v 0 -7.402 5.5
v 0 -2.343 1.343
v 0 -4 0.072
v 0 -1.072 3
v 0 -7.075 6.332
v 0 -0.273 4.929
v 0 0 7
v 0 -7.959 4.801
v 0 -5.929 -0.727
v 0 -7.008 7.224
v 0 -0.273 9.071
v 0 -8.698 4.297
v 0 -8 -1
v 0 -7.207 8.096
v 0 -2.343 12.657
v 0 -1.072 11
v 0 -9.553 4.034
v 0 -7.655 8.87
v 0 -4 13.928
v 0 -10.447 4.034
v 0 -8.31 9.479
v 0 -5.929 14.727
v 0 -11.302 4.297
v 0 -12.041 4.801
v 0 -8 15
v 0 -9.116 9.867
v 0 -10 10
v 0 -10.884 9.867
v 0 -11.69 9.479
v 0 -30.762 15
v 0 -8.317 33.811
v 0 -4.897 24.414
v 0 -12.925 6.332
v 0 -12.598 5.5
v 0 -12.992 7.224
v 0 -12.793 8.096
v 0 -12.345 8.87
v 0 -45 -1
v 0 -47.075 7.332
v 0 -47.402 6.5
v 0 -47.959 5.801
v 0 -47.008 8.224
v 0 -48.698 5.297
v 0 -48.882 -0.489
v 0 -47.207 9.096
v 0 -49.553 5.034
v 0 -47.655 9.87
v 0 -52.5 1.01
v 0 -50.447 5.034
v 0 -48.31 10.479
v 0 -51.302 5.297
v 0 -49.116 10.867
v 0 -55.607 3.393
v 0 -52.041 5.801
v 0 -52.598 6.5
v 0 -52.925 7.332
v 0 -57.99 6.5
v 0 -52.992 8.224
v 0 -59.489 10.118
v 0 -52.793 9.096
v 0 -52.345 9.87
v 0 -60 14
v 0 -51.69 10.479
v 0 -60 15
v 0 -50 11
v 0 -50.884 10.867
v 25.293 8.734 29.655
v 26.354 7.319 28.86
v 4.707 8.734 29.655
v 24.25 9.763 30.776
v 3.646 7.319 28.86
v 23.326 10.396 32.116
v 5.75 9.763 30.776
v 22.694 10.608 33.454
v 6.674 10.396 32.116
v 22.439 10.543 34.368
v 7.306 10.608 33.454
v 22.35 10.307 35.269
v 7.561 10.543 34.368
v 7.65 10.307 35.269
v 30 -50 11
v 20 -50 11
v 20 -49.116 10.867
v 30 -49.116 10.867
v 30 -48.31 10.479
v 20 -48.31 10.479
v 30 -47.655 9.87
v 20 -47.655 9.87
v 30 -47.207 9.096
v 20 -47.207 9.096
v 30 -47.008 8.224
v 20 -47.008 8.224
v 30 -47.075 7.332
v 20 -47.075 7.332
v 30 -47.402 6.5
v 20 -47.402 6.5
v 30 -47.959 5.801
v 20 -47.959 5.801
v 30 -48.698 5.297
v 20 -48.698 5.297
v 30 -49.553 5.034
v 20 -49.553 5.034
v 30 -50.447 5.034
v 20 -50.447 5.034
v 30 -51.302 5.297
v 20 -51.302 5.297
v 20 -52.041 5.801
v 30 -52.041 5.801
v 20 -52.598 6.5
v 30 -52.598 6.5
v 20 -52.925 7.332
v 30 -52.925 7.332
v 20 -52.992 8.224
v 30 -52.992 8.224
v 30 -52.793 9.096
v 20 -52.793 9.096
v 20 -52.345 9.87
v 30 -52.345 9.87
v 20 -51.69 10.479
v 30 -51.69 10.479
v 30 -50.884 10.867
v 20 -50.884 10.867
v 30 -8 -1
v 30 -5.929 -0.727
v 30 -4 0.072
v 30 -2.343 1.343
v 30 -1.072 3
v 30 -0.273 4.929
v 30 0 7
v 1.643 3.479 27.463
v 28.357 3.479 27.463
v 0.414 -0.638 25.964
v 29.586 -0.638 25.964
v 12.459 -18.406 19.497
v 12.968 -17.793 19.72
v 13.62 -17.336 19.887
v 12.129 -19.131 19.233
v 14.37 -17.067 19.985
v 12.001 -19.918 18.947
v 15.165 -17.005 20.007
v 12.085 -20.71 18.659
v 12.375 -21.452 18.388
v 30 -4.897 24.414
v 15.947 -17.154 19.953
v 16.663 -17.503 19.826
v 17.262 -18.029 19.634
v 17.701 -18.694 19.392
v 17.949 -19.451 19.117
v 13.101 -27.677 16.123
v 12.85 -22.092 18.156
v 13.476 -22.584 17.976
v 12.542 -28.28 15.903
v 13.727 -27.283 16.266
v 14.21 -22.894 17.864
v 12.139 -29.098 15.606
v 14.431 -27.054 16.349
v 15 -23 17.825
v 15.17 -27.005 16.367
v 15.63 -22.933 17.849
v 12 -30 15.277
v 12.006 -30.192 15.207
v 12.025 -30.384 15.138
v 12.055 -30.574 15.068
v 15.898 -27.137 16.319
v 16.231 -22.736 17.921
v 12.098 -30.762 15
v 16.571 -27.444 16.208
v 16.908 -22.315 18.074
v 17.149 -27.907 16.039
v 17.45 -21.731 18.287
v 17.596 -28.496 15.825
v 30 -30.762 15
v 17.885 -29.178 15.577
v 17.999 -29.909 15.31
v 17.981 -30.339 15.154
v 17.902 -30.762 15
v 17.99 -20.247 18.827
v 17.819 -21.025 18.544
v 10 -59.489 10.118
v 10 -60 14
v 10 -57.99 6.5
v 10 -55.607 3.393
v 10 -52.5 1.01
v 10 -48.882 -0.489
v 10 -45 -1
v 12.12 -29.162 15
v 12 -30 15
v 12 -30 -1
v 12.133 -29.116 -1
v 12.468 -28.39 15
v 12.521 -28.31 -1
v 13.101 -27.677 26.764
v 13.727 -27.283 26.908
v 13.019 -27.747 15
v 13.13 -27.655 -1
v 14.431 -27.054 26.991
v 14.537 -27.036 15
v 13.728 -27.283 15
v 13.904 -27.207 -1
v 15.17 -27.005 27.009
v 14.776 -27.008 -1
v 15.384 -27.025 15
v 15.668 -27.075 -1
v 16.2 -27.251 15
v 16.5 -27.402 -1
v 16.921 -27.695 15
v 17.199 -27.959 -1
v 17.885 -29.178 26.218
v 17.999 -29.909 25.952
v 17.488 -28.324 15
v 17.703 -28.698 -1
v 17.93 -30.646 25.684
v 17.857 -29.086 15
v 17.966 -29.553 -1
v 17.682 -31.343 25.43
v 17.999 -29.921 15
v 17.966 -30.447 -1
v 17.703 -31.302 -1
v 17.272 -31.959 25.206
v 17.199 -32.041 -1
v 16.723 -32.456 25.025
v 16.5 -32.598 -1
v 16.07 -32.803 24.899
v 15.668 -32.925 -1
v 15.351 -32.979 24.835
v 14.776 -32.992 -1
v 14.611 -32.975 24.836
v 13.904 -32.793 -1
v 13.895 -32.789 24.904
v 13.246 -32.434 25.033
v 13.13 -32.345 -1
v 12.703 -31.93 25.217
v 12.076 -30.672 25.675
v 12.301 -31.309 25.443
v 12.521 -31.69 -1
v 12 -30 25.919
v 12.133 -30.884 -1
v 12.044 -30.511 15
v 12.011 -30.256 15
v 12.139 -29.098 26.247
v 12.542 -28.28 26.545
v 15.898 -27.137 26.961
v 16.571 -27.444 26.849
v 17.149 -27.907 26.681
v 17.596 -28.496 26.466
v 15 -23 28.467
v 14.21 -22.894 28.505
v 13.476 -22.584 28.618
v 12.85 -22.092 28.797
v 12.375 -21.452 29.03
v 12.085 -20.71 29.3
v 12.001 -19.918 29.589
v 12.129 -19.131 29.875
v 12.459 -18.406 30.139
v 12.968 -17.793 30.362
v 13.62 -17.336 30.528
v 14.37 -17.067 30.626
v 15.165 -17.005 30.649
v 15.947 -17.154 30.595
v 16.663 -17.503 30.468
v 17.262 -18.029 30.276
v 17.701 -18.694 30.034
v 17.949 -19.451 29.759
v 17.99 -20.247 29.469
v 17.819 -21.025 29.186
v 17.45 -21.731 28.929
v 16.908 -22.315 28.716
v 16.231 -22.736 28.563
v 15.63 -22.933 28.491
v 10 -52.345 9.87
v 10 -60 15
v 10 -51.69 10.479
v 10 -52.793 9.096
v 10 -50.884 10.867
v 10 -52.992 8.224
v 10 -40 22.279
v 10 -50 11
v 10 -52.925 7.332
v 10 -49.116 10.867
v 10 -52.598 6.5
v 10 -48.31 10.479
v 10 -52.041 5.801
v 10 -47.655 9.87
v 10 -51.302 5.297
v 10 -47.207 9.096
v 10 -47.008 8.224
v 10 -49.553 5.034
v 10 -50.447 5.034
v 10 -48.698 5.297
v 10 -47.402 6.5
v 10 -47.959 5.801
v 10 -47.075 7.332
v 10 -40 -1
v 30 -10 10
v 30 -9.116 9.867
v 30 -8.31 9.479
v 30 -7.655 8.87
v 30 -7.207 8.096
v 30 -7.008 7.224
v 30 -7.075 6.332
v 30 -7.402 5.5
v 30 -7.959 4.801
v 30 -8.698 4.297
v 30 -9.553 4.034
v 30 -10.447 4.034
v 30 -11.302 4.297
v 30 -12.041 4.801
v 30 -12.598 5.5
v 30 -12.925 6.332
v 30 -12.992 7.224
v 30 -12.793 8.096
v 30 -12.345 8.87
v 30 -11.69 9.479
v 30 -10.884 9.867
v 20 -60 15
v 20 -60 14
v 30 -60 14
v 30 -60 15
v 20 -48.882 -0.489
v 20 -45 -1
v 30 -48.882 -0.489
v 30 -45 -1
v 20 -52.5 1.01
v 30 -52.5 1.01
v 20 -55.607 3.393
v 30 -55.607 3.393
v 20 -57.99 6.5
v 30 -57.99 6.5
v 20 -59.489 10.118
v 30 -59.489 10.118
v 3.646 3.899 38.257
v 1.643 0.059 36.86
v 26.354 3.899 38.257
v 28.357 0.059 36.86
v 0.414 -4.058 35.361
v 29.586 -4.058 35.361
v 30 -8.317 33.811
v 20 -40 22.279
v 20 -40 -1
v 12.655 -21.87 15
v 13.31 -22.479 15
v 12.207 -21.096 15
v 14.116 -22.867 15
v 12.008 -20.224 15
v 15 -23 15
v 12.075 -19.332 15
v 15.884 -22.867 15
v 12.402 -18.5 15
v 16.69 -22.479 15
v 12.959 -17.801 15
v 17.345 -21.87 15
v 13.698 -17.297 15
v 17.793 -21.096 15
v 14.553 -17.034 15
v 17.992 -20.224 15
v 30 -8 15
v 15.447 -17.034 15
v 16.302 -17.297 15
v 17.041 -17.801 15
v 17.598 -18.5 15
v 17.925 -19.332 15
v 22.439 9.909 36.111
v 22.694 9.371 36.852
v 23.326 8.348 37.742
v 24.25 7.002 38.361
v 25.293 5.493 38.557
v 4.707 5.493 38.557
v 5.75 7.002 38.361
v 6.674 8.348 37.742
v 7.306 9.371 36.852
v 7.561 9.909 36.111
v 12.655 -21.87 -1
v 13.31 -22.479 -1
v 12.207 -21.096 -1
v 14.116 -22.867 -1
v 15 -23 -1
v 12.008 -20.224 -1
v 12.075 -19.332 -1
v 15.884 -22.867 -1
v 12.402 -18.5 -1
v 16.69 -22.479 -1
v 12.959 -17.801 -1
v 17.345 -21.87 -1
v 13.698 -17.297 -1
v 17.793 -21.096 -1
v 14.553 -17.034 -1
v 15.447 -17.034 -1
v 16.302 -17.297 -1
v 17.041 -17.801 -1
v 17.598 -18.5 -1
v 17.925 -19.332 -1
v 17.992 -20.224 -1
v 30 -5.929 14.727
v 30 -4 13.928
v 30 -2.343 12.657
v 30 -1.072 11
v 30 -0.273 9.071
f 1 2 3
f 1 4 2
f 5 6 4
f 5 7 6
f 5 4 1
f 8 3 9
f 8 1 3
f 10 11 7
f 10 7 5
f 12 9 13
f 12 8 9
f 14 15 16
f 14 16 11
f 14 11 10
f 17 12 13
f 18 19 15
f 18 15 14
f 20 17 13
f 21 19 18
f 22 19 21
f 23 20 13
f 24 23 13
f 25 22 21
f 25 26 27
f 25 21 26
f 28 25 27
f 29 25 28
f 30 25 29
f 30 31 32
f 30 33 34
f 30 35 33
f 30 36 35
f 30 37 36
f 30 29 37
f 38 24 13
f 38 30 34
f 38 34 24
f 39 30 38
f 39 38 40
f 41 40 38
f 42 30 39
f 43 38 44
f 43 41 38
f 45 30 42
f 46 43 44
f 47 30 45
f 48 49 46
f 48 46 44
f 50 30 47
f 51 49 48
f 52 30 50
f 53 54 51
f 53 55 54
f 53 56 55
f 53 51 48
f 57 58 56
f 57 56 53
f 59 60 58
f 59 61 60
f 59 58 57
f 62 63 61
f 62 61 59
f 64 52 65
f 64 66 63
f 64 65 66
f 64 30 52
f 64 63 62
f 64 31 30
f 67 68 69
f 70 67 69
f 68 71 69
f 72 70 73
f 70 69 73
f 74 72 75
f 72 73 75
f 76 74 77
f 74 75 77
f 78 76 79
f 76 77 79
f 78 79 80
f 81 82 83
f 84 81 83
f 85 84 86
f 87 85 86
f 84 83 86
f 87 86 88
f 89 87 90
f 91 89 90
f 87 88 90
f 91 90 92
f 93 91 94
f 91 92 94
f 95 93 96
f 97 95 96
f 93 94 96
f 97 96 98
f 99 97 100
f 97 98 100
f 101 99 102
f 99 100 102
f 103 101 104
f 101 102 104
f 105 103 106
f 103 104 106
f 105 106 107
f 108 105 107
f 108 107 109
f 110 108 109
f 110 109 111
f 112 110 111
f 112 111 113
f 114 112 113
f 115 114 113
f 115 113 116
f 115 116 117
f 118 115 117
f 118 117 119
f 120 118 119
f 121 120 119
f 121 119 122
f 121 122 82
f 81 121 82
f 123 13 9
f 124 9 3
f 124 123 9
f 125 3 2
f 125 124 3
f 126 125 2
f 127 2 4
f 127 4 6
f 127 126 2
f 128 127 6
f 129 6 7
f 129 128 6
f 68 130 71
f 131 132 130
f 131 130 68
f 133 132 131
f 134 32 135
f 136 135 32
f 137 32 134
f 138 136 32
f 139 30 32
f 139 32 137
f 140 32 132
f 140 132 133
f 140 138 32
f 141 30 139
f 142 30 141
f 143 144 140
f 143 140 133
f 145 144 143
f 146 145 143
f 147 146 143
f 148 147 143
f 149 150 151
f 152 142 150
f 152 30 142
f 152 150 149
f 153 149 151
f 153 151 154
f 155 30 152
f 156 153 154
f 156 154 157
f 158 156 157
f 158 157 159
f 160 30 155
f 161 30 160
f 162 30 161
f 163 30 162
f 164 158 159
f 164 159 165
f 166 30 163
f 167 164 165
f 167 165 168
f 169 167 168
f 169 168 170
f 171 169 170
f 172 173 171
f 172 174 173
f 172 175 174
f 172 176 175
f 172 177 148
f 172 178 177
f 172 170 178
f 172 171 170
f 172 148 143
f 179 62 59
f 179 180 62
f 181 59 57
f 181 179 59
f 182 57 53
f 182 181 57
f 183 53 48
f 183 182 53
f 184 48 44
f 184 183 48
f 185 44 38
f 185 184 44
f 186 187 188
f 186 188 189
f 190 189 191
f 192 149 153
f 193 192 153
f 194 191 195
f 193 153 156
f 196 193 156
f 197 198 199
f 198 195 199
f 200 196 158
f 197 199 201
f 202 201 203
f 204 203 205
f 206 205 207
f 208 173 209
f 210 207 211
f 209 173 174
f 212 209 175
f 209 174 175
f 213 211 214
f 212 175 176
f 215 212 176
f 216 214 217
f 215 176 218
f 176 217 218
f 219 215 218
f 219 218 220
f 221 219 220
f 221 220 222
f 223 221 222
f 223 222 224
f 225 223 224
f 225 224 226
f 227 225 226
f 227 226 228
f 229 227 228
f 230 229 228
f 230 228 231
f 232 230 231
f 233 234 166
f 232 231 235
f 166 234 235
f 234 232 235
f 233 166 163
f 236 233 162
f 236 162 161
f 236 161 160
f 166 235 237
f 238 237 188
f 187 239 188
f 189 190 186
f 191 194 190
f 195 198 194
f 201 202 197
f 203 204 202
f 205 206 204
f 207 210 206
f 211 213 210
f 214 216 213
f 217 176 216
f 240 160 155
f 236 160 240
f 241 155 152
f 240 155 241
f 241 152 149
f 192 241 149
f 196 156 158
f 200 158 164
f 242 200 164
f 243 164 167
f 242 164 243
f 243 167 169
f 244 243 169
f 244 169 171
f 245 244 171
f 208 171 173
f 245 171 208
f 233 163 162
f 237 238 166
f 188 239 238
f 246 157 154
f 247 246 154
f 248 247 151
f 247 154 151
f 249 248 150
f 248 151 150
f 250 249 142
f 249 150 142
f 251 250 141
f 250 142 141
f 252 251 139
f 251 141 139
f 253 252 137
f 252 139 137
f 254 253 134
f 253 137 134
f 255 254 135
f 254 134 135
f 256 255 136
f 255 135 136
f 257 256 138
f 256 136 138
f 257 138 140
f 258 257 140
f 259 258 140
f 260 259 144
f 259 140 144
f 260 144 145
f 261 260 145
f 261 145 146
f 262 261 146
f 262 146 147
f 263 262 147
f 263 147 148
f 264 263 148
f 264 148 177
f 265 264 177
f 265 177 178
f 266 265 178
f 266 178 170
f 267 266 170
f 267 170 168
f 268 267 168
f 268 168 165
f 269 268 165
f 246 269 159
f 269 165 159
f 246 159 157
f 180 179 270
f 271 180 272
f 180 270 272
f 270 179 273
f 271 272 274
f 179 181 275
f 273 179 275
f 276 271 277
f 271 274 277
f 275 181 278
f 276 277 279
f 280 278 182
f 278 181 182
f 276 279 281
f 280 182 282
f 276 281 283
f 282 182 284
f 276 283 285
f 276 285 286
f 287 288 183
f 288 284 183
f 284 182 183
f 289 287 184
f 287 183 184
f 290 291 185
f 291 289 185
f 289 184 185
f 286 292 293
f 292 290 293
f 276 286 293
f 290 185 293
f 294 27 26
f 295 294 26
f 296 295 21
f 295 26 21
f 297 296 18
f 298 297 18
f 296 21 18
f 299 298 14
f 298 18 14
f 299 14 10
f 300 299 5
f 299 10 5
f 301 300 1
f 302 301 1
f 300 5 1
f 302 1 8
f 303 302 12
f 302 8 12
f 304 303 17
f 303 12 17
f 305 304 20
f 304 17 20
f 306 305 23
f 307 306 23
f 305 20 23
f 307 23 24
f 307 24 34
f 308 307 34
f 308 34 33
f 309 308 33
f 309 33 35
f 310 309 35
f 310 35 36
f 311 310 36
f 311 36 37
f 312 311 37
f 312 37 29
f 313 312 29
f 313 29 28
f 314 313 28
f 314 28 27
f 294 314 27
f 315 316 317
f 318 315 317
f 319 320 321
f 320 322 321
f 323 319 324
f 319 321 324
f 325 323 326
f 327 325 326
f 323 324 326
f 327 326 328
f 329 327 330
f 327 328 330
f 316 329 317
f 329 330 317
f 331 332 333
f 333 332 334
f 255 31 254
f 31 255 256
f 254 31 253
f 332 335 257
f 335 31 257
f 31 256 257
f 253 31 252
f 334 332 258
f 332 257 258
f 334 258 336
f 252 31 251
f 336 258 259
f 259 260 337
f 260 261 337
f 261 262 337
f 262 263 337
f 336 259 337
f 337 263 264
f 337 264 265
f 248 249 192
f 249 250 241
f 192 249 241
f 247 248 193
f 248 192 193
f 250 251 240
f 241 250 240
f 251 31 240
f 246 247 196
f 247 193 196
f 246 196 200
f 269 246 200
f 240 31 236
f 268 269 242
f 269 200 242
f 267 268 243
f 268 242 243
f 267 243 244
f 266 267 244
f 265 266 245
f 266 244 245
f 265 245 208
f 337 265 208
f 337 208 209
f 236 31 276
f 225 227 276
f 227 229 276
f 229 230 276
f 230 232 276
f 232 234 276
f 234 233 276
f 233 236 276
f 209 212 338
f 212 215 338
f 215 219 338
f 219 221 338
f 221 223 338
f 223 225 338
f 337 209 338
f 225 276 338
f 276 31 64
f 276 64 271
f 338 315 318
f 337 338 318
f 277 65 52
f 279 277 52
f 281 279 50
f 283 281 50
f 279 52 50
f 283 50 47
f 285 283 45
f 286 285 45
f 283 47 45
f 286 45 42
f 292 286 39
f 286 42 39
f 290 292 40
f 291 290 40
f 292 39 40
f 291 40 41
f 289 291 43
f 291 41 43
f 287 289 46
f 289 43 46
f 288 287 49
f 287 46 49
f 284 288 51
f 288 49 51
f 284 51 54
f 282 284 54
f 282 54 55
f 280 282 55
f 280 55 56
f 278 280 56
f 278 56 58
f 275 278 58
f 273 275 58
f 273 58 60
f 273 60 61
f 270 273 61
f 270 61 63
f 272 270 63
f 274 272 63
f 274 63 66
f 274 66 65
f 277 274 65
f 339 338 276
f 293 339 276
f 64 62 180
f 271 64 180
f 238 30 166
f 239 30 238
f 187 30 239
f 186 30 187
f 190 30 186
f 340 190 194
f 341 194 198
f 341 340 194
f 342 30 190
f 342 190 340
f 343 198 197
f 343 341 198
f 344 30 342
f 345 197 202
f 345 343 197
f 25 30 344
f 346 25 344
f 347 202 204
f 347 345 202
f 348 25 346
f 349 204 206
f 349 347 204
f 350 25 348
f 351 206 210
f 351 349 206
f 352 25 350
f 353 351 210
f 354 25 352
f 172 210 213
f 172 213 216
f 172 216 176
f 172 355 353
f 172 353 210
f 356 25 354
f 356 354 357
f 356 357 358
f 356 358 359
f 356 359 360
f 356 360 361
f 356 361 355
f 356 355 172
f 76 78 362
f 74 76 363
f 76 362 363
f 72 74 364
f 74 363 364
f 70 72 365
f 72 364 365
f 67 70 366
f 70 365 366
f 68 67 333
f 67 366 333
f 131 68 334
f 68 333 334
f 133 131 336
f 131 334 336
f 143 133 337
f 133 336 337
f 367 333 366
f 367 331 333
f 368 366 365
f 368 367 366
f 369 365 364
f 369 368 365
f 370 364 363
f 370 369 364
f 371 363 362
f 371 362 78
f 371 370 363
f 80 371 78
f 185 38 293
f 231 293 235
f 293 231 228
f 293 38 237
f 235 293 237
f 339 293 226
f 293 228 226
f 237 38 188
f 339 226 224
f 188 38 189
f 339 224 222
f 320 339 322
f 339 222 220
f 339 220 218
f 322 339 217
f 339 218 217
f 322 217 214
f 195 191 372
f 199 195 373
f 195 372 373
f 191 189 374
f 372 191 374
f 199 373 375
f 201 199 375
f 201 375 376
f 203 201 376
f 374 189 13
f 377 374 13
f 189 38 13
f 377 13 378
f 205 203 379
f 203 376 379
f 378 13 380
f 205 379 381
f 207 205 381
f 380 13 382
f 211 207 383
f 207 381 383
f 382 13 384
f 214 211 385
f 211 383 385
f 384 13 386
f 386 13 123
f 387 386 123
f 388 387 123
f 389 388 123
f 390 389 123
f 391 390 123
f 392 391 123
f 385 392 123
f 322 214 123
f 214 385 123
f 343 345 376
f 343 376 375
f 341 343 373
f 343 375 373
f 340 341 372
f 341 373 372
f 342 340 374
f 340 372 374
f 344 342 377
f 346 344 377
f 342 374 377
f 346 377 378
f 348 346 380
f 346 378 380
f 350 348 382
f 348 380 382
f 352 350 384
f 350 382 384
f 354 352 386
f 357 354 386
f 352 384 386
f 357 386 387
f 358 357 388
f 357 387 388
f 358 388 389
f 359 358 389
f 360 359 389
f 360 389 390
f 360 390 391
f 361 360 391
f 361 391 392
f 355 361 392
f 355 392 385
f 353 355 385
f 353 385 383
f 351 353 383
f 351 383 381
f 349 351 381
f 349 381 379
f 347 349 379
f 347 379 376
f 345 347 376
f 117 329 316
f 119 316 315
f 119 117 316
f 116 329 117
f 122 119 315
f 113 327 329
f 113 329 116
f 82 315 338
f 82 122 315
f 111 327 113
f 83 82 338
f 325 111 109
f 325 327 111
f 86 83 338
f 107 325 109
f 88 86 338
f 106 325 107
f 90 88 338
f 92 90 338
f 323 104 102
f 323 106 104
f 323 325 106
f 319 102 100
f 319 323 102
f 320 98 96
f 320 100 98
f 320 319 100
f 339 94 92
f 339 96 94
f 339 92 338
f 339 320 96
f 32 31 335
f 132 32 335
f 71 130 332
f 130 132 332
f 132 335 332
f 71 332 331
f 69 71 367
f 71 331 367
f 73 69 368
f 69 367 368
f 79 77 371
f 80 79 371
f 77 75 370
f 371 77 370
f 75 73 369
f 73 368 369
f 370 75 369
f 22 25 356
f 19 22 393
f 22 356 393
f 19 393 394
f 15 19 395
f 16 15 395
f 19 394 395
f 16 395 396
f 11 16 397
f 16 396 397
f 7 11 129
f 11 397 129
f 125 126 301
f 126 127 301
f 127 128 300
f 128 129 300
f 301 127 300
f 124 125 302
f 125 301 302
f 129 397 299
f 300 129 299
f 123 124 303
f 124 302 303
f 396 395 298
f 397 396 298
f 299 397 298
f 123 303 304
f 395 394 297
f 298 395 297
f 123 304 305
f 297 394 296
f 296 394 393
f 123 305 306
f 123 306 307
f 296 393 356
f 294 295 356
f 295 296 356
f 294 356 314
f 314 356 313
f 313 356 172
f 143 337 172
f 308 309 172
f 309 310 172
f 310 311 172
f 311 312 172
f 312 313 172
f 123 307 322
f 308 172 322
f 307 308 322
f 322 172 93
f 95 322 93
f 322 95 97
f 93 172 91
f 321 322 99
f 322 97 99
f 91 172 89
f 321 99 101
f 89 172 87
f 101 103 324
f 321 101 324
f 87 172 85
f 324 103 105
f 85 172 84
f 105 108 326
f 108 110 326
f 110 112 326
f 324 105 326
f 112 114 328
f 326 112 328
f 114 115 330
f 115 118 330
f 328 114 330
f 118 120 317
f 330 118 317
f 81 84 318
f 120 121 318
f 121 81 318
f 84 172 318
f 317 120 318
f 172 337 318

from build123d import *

# Parameters (mm, degrees)
BOSS_EXTRUDE1_DEPTH      = 15
BOSS_EXTRUDE1_DEPTH_BACK = 1
SKETCH1_W                = 30
SKETCH1_H                = 60
SKETCH2_R                = 3
CUT_EXTRUDE1_DEPTH       = 49
FILLET1_R                = 8
SKETCH6_W                = 30
SKETCH6_H                = 80
BOSS_EXTRUDE2_DEPTH      = 10
SKETCH7_R                = 3
CUT_EXTRUDE2_DEPTH       = 38
SKETCH8_R                = 3
CUT_EXTRUDE3_DEPTH       = 49
SKETCH11_W               = 10
SKETCH11_H               = 20
CUT_EXTRUDE4_DEPTH       = 30
FILLET2_R                = 15
FILLET3_R                = 25
CUT_EXTRUDE5_DEPTH       = 10
FILLET5_R                = 5


# Some blends are built 0.0001 mm under size
with BuildPart() as part:
    # Sketch1 → Boss-Extrude1 (new, two sides: drawn at the far end of the back side and taken through both)
    with BuildSketch(Plane.XY.offset(-BOSS_EXTRUDE1_DEPTH_BACK)):
        with Locations((15, -30)):
            Rectangle(SKETCH1_W, SKETCH1_H)
    extrude(amount=BOSS_EXTRUDE1_DEPTH + BOSS_EXTRUDE1_DEPTH_BACK)

    # Sketch2 → Cut-Extrude1 (cut)
    with BuildSketch(Plane.ZY):
        with Locations((7, -10)):
            Circle(SKETCH2_R)
    extrude(amount=-CUT_EXTRUDE1_DEPTH, mode=Mode.SUBTRACT)

    # Fillet1
    fillet1_edges = [part.edges().sort_by_distance(p)[0] for p in [
        (15, 0, 15),
        (15, 0, -1),
    ]]
    fillet(fillet1_edges, radius=FILLET1_R - 0.0001)  # a hair under: the kernel refuses the full size

    # Sketch6 → Boss-Extrude2 (add)
    with BuildSketch(Plane(origin=(0, -11.839573779, 32.528961614), x_dir=(1, 0, 0), z_dir=(0, 0.34202014332566943, -0.9396926207859081))):
        with Locations((15, 11.251255097)):
            Rectangle(SKETCH6_W, SKETCH6_H)
    extrude(amount=BOSS_EXTRUDE2_DEPTH)

    # Sketch7 → Cut-Extrude2 (cut)
    with BuildSketch(Plane(origin=(0, 0, -1), x_dir=(-1, 0, 0), z_dir=(0, 0, -1))):
        with Locations(Location((-15, -20, 0), (0, 0, 270))):
            Circle(SKETCH7_R)
        with Locations((-15, -30)):
            Circle(SKETCH7_R)
    extrude(amount=-CUT_EXTRUDE2_DEPTH, mode=Mode.SUBTRACT)

    # Sketch8 → Cut-Extrude3 (cut)
    with BuildSketch(Plane.ZY):
        with Locations((8, -50)):
            Circle(SKETCH8_R)
    extrude(amount=-CUT_EXTRUDE3_DEPTH, mode=Mode.SUBTRACT)

    # Sketch11 → Cut-Extrude4 (cut)
    with BuildSketch(Plane(origin=(0, 0, -1), x_dir=(-1, 0, 0), z_dir=(0, 0, -1))):
        with Locations((-15, -50)):
            Rectangle(SKETCH11_W, SKETCH11_H)
    extrude(amount=-CUT_EXTRUDE4_DEPTH, mode=Mode.SUBTRACT)

    # Fillet2
    fillet2_edges = [part.edges().sort_by_distance(p)[0] for p in [
        (25, -60, -1),
        (5, -60, -1),
    ]]
    fillet(fillet2_edges, radius=FILLET2_R)

    # Fillet3
    # the kernel refuses this fillet: 25 mm, written as the material it takes off along each edge
    with BuildSketch(Plane(origin=(0, -6.200849295, 101.092400265), x_dir=(1, 0, 0), z_dir=(0, 0.34202014332566943, -0.9396926207859082)), Plane(origin=(30, -6.200849295, 101.092400265), x_dir=(0, -0.9396926207859081, -0.3420201433256693), z_dir=(0, 0.34202014332566943, -0.9396926207859082))) as fillet3_piece_1:
        with BuildLine():
            CenterArc((FILLET3_R, FILLET3_R), FILLET3_R, 180, 90)
            Line((0, FILLET3_R), (0, 0))
            Line((0, 0), (FILLET3_R, 0))
        make_face()
    extrude(amount=135, mode=Mode.SUBTRACT)

    # Sketch12 → Cut-Extrude5 (cut)
    with BuildSketch(Plane(origin=(0, -8.419372346, 23.132035406), x_dir=(-1, 0, 0), z_dir=(0, 0.34202014332566943, -0.9396926207859082))):
        with BuildLine():
            Line((-15, 21.748370766), (-7.650260268, 21.748370766))
            ThreePointArc((-7.650260268, 21.748370766), (-15, 27.089106291), (-22.349739732, 21.748370766))
            Line((-22.349739732, 21.748370766), (-15, 21.748370766))
        make_face()
    extrude(amount=-CUT_EXTRUDE5_DEPTH, mode=Mode.SUBTRACT)

    # Fillet5
    fillet5_edges = [part.edges().sort_by_distance(p)[0] for p in [
        (15, 8.597209744, 39.967342501),
        (15, 12.017411178, 30.570416293),
    ]]
    fillet(fillet5_edges, radius=FILLET5_R - 0.0001)  # a hair under: the kernel refuses the full size


solid = part.part
